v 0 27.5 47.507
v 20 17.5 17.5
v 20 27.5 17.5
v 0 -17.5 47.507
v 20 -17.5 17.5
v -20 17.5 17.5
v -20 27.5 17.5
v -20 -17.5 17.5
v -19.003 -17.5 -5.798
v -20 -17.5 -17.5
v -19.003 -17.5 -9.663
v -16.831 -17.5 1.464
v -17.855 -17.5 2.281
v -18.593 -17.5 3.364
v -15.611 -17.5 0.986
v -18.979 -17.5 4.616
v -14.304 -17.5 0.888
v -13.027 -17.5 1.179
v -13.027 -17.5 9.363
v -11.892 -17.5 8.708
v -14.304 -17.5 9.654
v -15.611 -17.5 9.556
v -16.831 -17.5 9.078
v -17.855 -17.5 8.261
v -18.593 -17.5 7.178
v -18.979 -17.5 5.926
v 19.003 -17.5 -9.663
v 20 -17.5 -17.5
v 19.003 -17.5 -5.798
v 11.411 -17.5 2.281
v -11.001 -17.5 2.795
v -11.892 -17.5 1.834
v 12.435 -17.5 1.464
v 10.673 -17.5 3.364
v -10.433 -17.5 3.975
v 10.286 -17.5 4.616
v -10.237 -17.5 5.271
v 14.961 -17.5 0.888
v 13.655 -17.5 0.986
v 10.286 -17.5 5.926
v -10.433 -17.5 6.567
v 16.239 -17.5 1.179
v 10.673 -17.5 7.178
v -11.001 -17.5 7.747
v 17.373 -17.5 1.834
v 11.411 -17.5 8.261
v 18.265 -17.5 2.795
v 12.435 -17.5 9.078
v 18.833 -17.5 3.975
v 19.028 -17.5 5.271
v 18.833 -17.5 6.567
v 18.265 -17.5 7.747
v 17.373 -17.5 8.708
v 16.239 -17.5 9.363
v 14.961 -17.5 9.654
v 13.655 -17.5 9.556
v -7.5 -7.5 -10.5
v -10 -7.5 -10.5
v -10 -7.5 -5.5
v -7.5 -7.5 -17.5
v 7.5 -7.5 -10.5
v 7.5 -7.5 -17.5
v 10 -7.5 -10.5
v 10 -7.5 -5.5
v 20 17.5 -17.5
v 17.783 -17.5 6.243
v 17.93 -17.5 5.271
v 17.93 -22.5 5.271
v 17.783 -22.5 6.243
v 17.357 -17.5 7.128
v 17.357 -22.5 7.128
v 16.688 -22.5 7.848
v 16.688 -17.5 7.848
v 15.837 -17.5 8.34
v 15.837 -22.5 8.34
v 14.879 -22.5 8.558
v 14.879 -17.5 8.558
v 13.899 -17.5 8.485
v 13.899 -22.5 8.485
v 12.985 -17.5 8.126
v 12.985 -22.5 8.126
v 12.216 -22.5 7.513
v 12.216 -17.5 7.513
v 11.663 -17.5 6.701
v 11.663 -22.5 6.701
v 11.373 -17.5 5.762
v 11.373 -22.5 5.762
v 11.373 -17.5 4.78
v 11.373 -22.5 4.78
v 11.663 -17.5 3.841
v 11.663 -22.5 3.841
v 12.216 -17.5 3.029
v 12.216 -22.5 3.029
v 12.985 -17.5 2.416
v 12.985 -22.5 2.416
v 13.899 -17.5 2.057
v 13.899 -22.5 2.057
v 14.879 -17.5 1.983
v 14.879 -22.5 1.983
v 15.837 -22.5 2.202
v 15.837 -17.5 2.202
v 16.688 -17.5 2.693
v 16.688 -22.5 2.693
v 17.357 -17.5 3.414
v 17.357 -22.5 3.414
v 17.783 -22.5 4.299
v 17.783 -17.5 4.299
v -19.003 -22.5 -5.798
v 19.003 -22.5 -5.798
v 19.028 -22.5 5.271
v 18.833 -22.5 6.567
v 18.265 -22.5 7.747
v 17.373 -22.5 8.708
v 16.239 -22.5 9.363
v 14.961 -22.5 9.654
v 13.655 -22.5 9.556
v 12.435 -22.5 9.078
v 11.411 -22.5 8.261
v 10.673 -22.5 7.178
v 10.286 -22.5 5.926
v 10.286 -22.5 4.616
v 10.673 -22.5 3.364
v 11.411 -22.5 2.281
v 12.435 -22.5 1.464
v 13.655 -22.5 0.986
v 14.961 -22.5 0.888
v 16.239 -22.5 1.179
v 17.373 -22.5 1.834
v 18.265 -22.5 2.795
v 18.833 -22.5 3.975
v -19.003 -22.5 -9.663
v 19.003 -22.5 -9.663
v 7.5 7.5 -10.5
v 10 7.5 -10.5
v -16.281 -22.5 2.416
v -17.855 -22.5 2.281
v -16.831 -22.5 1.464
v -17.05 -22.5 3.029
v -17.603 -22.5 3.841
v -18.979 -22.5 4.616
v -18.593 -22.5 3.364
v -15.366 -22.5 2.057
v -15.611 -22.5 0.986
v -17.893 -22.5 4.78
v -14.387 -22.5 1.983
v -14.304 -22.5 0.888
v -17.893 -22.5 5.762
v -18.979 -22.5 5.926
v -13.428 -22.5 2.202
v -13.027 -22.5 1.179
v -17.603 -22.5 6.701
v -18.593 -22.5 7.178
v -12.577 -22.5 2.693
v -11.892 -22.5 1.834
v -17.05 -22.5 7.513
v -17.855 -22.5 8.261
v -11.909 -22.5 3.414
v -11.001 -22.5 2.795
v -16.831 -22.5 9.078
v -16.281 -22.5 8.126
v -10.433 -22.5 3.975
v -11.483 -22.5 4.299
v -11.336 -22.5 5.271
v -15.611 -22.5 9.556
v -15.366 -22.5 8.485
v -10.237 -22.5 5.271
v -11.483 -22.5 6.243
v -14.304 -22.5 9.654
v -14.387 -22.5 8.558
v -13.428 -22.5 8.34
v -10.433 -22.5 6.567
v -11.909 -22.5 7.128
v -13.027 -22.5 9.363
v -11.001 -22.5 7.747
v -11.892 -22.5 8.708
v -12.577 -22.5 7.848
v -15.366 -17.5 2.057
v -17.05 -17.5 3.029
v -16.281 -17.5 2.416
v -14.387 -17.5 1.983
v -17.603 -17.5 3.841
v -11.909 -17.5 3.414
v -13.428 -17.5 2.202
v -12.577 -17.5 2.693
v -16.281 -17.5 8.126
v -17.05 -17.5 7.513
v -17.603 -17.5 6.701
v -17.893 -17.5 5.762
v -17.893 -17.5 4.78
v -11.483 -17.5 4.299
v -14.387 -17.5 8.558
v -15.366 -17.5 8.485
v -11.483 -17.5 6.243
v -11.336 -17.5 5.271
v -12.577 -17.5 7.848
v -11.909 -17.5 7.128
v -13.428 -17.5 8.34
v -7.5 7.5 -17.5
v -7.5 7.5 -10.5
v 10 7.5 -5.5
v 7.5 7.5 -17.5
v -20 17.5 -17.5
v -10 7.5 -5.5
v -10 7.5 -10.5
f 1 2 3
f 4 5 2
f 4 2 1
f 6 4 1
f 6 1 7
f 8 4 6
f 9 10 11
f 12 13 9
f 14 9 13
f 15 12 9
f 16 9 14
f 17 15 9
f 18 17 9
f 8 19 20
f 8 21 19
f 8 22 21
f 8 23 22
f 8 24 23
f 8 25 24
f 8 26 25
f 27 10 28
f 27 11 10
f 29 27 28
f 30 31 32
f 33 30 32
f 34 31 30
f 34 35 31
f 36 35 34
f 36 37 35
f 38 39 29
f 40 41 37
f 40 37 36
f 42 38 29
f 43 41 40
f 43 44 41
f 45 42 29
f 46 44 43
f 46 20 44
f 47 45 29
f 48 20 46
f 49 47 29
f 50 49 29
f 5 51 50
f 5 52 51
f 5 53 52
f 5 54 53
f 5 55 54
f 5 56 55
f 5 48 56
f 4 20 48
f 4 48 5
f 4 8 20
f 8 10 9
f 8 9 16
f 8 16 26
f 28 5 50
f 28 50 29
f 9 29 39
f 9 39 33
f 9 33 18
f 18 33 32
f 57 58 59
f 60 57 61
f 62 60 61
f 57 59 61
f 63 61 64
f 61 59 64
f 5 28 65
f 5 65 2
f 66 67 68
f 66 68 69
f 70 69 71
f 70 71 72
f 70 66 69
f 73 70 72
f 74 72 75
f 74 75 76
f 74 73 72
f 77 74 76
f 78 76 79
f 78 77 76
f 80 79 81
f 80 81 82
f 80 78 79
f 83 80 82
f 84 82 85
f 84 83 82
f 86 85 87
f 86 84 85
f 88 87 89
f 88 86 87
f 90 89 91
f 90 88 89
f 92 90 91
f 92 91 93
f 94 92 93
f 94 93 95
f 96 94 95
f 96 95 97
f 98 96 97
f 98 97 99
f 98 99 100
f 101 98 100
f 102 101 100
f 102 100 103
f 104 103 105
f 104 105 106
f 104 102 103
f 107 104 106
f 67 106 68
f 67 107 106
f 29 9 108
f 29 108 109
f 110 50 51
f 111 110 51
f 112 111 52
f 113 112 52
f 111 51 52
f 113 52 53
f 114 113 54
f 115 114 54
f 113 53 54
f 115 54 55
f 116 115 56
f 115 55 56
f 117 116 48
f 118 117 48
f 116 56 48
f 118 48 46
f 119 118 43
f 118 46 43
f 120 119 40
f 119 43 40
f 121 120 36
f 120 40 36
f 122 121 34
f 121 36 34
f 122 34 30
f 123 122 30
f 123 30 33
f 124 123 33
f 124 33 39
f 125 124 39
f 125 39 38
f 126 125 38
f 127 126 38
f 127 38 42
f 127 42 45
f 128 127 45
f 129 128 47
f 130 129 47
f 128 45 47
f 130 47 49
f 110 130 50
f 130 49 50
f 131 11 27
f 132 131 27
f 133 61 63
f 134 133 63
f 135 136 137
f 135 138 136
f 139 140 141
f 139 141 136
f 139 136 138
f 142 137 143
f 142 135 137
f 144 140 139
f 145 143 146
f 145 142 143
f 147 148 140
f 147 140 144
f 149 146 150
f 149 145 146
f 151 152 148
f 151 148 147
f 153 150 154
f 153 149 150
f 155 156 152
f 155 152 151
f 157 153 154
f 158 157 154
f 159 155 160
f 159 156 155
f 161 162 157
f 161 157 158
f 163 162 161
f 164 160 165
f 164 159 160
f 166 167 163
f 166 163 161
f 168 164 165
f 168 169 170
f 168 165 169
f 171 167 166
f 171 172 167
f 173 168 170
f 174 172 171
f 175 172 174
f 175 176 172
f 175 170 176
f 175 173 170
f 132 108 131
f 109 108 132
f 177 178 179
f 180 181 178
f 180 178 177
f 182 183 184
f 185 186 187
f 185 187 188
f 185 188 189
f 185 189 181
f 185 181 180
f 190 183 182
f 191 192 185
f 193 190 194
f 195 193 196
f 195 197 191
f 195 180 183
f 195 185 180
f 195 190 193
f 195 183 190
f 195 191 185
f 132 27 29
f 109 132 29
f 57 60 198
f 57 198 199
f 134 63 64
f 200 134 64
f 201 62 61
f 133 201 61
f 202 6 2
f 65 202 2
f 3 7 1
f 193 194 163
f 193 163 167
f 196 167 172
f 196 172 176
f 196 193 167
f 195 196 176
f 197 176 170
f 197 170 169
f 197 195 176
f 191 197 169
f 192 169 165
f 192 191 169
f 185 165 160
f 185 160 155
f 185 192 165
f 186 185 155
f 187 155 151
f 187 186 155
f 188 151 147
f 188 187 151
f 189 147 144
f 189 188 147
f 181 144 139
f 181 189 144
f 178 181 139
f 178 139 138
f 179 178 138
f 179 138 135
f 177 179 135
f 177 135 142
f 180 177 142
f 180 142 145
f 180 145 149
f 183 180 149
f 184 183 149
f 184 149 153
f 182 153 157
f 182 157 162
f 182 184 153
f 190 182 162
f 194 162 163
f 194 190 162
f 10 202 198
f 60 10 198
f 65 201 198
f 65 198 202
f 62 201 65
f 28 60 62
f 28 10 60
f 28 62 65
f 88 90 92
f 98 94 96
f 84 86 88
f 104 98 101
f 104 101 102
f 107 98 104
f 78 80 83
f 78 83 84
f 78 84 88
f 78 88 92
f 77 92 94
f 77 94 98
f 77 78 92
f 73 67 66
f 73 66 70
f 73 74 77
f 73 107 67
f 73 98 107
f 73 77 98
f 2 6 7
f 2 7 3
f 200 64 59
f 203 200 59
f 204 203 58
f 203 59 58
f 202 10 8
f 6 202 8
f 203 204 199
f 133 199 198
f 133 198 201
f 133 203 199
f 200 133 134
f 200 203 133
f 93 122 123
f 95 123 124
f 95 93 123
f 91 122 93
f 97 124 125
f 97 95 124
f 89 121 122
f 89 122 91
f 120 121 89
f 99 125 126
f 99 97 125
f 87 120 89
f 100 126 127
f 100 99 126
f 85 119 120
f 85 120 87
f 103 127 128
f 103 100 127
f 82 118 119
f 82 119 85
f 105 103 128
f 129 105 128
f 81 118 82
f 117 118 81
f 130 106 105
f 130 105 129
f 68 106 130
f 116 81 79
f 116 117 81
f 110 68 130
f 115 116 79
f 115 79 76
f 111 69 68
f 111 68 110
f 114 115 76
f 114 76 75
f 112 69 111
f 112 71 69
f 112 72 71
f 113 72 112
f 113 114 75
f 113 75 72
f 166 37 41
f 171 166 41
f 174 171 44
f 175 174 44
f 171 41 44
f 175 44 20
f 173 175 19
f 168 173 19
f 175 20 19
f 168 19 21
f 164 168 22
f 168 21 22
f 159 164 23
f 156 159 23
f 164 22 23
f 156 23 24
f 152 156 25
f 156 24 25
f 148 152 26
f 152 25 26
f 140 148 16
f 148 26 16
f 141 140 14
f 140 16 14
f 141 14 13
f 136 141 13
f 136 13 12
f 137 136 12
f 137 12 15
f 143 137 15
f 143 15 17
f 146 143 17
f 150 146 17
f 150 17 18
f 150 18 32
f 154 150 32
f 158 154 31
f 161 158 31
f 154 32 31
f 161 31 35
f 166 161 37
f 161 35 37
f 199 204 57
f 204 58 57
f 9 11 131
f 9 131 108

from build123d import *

# Parameters (mm, degrees)
F0_W     = 40
F0_H     = 35
F1_DEPTH = 17.5
F2_W     = 15
F2_H     = 10
F3_DEPTH = 7.5
F4_R     = 4.3956172523
F4_R_2   = 3.2967313173
F4_W     = 38.0061380565
F4_H     = 3.8650305942
F5_DEPTH = 5
F9_DEPTH = 45


# Not quite as in the source:
# - the program builds the solid bodies; features that only make, move or delete a surface that nothing else refers to are left out


with BuildPart() as f1:
    # F0 (on Front) → F1 (new body, symmetric)
    with BuildSketch(Plane.XZ):
        Rectangle(F0_W, F0_H)
    extrude(amount=F1_DEPTH, both=True)

    # F2 (on Front) → F3 (cut, symmetric)
    with BuildSketch(Plane.XZ):
        with Locations((0, -15.5)):
            Rectangle(F2_W, F2_H)
        Polygon((-7.5, -10.5), (7.5, -10.5), (10, -10.5), (10, -5.5), (-10, -5.5), (-10, -10.5), align=None)
    extrude(amount=F3_DEPTH, both=True, mode=Mode.SUBTRACT)

    # F4 (on face) → F5 (join)
    with BuildSketch(Plane.XZ.offset(17.5)):
        with Locations((-14.6328676492, 5.2709789015)):
            Circle(F4_R)
        with Locations((-14.6328676492, 5.2709789015)):
            Circle(F4_R_2, mode=Mode.SUBTRACT)
        with Locations((14.6328676492, 5.2709789015)):
            Circle(F4_R)
        with Locations((14.6328676492, 5.2709789015)):
            Circle(F4_R_2, mode=Mode.SUBTRACT)
        with Locations((0, -7.730061654)):
            Rectangle(F4_W, F4_H)
    extrude(amount=F5_DEPTH)

    # F4 (on face) → F9 (join)
    with BuildSketch(Plane.XZ.offset(17.5)):
        Polygon((0, 47.5069768727), (-20, 17.5), (20, 17.5), align=None)
    extrude(amount=-F9_DEPTH)


solid = f1.part
